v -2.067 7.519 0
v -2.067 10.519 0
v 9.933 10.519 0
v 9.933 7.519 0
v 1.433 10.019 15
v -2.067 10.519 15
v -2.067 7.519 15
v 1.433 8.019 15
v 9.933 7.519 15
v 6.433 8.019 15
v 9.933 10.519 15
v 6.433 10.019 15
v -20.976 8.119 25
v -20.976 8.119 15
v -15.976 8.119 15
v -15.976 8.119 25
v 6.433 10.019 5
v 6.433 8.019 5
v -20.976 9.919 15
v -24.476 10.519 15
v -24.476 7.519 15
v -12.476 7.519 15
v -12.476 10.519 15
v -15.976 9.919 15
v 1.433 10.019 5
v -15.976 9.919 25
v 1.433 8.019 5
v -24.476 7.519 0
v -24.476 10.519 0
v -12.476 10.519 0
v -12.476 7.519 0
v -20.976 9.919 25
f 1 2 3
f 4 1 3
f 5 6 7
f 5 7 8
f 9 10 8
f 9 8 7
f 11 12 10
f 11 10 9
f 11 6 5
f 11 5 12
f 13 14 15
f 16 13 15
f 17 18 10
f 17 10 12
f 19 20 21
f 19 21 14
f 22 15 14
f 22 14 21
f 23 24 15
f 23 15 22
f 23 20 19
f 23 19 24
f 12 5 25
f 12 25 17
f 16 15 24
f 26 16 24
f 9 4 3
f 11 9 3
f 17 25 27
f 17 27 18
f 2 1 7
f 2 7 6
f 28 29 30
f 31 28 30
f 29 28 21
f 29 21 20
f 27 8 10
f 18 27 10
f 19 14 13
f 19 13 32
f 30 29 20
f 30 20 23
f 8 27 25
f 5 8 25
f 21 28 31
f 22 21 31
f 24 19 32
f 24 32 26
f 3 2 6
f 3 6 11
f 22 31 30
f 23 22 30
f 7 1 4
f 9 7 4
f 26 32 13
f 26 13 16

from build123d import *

# Parameters (mm, degrees)
F0_W     = 12
F0_H     = 3
F1_DEPTH = 15
F2_W     = 5
F2_H     = 1.8
F3_DEPTH = 10
F4_W     = 5
F4_H     = 2
F5_DEPTH = 10


with BuildPart() as f1:
    # F0 (on Top) → F1 (new body)
    with BuildSketch(Plane.XY):
        with Locations((-18.476369, 9.019)):
            Rectangle(F0_W, F0_H)
        with Locations((3.93327, 9.019)):
            Rectangle(F0_W, F0_H)
    extrude(amount=F1_DEPTH)

    # F2 (on face) → F3 (join)
    with BuildSketch(Plane.XY.offset(15)):
        with Locations((-18.476369, 9.019)):
            Rectangle(F2_W, F2_H)
    extrude(amount=F3_DEPTH)

    # F4 (on face) → F5 (cut)
    with BuildSketch(Plane.XY.offset(15)):
        with Locations((3.93327, 9.019)):
            Rectangle(F4_W, F4_H)
    extrude(amount=-F5_DEPTH, mode=Mode.SUBTRACT)


solid = f1.part
